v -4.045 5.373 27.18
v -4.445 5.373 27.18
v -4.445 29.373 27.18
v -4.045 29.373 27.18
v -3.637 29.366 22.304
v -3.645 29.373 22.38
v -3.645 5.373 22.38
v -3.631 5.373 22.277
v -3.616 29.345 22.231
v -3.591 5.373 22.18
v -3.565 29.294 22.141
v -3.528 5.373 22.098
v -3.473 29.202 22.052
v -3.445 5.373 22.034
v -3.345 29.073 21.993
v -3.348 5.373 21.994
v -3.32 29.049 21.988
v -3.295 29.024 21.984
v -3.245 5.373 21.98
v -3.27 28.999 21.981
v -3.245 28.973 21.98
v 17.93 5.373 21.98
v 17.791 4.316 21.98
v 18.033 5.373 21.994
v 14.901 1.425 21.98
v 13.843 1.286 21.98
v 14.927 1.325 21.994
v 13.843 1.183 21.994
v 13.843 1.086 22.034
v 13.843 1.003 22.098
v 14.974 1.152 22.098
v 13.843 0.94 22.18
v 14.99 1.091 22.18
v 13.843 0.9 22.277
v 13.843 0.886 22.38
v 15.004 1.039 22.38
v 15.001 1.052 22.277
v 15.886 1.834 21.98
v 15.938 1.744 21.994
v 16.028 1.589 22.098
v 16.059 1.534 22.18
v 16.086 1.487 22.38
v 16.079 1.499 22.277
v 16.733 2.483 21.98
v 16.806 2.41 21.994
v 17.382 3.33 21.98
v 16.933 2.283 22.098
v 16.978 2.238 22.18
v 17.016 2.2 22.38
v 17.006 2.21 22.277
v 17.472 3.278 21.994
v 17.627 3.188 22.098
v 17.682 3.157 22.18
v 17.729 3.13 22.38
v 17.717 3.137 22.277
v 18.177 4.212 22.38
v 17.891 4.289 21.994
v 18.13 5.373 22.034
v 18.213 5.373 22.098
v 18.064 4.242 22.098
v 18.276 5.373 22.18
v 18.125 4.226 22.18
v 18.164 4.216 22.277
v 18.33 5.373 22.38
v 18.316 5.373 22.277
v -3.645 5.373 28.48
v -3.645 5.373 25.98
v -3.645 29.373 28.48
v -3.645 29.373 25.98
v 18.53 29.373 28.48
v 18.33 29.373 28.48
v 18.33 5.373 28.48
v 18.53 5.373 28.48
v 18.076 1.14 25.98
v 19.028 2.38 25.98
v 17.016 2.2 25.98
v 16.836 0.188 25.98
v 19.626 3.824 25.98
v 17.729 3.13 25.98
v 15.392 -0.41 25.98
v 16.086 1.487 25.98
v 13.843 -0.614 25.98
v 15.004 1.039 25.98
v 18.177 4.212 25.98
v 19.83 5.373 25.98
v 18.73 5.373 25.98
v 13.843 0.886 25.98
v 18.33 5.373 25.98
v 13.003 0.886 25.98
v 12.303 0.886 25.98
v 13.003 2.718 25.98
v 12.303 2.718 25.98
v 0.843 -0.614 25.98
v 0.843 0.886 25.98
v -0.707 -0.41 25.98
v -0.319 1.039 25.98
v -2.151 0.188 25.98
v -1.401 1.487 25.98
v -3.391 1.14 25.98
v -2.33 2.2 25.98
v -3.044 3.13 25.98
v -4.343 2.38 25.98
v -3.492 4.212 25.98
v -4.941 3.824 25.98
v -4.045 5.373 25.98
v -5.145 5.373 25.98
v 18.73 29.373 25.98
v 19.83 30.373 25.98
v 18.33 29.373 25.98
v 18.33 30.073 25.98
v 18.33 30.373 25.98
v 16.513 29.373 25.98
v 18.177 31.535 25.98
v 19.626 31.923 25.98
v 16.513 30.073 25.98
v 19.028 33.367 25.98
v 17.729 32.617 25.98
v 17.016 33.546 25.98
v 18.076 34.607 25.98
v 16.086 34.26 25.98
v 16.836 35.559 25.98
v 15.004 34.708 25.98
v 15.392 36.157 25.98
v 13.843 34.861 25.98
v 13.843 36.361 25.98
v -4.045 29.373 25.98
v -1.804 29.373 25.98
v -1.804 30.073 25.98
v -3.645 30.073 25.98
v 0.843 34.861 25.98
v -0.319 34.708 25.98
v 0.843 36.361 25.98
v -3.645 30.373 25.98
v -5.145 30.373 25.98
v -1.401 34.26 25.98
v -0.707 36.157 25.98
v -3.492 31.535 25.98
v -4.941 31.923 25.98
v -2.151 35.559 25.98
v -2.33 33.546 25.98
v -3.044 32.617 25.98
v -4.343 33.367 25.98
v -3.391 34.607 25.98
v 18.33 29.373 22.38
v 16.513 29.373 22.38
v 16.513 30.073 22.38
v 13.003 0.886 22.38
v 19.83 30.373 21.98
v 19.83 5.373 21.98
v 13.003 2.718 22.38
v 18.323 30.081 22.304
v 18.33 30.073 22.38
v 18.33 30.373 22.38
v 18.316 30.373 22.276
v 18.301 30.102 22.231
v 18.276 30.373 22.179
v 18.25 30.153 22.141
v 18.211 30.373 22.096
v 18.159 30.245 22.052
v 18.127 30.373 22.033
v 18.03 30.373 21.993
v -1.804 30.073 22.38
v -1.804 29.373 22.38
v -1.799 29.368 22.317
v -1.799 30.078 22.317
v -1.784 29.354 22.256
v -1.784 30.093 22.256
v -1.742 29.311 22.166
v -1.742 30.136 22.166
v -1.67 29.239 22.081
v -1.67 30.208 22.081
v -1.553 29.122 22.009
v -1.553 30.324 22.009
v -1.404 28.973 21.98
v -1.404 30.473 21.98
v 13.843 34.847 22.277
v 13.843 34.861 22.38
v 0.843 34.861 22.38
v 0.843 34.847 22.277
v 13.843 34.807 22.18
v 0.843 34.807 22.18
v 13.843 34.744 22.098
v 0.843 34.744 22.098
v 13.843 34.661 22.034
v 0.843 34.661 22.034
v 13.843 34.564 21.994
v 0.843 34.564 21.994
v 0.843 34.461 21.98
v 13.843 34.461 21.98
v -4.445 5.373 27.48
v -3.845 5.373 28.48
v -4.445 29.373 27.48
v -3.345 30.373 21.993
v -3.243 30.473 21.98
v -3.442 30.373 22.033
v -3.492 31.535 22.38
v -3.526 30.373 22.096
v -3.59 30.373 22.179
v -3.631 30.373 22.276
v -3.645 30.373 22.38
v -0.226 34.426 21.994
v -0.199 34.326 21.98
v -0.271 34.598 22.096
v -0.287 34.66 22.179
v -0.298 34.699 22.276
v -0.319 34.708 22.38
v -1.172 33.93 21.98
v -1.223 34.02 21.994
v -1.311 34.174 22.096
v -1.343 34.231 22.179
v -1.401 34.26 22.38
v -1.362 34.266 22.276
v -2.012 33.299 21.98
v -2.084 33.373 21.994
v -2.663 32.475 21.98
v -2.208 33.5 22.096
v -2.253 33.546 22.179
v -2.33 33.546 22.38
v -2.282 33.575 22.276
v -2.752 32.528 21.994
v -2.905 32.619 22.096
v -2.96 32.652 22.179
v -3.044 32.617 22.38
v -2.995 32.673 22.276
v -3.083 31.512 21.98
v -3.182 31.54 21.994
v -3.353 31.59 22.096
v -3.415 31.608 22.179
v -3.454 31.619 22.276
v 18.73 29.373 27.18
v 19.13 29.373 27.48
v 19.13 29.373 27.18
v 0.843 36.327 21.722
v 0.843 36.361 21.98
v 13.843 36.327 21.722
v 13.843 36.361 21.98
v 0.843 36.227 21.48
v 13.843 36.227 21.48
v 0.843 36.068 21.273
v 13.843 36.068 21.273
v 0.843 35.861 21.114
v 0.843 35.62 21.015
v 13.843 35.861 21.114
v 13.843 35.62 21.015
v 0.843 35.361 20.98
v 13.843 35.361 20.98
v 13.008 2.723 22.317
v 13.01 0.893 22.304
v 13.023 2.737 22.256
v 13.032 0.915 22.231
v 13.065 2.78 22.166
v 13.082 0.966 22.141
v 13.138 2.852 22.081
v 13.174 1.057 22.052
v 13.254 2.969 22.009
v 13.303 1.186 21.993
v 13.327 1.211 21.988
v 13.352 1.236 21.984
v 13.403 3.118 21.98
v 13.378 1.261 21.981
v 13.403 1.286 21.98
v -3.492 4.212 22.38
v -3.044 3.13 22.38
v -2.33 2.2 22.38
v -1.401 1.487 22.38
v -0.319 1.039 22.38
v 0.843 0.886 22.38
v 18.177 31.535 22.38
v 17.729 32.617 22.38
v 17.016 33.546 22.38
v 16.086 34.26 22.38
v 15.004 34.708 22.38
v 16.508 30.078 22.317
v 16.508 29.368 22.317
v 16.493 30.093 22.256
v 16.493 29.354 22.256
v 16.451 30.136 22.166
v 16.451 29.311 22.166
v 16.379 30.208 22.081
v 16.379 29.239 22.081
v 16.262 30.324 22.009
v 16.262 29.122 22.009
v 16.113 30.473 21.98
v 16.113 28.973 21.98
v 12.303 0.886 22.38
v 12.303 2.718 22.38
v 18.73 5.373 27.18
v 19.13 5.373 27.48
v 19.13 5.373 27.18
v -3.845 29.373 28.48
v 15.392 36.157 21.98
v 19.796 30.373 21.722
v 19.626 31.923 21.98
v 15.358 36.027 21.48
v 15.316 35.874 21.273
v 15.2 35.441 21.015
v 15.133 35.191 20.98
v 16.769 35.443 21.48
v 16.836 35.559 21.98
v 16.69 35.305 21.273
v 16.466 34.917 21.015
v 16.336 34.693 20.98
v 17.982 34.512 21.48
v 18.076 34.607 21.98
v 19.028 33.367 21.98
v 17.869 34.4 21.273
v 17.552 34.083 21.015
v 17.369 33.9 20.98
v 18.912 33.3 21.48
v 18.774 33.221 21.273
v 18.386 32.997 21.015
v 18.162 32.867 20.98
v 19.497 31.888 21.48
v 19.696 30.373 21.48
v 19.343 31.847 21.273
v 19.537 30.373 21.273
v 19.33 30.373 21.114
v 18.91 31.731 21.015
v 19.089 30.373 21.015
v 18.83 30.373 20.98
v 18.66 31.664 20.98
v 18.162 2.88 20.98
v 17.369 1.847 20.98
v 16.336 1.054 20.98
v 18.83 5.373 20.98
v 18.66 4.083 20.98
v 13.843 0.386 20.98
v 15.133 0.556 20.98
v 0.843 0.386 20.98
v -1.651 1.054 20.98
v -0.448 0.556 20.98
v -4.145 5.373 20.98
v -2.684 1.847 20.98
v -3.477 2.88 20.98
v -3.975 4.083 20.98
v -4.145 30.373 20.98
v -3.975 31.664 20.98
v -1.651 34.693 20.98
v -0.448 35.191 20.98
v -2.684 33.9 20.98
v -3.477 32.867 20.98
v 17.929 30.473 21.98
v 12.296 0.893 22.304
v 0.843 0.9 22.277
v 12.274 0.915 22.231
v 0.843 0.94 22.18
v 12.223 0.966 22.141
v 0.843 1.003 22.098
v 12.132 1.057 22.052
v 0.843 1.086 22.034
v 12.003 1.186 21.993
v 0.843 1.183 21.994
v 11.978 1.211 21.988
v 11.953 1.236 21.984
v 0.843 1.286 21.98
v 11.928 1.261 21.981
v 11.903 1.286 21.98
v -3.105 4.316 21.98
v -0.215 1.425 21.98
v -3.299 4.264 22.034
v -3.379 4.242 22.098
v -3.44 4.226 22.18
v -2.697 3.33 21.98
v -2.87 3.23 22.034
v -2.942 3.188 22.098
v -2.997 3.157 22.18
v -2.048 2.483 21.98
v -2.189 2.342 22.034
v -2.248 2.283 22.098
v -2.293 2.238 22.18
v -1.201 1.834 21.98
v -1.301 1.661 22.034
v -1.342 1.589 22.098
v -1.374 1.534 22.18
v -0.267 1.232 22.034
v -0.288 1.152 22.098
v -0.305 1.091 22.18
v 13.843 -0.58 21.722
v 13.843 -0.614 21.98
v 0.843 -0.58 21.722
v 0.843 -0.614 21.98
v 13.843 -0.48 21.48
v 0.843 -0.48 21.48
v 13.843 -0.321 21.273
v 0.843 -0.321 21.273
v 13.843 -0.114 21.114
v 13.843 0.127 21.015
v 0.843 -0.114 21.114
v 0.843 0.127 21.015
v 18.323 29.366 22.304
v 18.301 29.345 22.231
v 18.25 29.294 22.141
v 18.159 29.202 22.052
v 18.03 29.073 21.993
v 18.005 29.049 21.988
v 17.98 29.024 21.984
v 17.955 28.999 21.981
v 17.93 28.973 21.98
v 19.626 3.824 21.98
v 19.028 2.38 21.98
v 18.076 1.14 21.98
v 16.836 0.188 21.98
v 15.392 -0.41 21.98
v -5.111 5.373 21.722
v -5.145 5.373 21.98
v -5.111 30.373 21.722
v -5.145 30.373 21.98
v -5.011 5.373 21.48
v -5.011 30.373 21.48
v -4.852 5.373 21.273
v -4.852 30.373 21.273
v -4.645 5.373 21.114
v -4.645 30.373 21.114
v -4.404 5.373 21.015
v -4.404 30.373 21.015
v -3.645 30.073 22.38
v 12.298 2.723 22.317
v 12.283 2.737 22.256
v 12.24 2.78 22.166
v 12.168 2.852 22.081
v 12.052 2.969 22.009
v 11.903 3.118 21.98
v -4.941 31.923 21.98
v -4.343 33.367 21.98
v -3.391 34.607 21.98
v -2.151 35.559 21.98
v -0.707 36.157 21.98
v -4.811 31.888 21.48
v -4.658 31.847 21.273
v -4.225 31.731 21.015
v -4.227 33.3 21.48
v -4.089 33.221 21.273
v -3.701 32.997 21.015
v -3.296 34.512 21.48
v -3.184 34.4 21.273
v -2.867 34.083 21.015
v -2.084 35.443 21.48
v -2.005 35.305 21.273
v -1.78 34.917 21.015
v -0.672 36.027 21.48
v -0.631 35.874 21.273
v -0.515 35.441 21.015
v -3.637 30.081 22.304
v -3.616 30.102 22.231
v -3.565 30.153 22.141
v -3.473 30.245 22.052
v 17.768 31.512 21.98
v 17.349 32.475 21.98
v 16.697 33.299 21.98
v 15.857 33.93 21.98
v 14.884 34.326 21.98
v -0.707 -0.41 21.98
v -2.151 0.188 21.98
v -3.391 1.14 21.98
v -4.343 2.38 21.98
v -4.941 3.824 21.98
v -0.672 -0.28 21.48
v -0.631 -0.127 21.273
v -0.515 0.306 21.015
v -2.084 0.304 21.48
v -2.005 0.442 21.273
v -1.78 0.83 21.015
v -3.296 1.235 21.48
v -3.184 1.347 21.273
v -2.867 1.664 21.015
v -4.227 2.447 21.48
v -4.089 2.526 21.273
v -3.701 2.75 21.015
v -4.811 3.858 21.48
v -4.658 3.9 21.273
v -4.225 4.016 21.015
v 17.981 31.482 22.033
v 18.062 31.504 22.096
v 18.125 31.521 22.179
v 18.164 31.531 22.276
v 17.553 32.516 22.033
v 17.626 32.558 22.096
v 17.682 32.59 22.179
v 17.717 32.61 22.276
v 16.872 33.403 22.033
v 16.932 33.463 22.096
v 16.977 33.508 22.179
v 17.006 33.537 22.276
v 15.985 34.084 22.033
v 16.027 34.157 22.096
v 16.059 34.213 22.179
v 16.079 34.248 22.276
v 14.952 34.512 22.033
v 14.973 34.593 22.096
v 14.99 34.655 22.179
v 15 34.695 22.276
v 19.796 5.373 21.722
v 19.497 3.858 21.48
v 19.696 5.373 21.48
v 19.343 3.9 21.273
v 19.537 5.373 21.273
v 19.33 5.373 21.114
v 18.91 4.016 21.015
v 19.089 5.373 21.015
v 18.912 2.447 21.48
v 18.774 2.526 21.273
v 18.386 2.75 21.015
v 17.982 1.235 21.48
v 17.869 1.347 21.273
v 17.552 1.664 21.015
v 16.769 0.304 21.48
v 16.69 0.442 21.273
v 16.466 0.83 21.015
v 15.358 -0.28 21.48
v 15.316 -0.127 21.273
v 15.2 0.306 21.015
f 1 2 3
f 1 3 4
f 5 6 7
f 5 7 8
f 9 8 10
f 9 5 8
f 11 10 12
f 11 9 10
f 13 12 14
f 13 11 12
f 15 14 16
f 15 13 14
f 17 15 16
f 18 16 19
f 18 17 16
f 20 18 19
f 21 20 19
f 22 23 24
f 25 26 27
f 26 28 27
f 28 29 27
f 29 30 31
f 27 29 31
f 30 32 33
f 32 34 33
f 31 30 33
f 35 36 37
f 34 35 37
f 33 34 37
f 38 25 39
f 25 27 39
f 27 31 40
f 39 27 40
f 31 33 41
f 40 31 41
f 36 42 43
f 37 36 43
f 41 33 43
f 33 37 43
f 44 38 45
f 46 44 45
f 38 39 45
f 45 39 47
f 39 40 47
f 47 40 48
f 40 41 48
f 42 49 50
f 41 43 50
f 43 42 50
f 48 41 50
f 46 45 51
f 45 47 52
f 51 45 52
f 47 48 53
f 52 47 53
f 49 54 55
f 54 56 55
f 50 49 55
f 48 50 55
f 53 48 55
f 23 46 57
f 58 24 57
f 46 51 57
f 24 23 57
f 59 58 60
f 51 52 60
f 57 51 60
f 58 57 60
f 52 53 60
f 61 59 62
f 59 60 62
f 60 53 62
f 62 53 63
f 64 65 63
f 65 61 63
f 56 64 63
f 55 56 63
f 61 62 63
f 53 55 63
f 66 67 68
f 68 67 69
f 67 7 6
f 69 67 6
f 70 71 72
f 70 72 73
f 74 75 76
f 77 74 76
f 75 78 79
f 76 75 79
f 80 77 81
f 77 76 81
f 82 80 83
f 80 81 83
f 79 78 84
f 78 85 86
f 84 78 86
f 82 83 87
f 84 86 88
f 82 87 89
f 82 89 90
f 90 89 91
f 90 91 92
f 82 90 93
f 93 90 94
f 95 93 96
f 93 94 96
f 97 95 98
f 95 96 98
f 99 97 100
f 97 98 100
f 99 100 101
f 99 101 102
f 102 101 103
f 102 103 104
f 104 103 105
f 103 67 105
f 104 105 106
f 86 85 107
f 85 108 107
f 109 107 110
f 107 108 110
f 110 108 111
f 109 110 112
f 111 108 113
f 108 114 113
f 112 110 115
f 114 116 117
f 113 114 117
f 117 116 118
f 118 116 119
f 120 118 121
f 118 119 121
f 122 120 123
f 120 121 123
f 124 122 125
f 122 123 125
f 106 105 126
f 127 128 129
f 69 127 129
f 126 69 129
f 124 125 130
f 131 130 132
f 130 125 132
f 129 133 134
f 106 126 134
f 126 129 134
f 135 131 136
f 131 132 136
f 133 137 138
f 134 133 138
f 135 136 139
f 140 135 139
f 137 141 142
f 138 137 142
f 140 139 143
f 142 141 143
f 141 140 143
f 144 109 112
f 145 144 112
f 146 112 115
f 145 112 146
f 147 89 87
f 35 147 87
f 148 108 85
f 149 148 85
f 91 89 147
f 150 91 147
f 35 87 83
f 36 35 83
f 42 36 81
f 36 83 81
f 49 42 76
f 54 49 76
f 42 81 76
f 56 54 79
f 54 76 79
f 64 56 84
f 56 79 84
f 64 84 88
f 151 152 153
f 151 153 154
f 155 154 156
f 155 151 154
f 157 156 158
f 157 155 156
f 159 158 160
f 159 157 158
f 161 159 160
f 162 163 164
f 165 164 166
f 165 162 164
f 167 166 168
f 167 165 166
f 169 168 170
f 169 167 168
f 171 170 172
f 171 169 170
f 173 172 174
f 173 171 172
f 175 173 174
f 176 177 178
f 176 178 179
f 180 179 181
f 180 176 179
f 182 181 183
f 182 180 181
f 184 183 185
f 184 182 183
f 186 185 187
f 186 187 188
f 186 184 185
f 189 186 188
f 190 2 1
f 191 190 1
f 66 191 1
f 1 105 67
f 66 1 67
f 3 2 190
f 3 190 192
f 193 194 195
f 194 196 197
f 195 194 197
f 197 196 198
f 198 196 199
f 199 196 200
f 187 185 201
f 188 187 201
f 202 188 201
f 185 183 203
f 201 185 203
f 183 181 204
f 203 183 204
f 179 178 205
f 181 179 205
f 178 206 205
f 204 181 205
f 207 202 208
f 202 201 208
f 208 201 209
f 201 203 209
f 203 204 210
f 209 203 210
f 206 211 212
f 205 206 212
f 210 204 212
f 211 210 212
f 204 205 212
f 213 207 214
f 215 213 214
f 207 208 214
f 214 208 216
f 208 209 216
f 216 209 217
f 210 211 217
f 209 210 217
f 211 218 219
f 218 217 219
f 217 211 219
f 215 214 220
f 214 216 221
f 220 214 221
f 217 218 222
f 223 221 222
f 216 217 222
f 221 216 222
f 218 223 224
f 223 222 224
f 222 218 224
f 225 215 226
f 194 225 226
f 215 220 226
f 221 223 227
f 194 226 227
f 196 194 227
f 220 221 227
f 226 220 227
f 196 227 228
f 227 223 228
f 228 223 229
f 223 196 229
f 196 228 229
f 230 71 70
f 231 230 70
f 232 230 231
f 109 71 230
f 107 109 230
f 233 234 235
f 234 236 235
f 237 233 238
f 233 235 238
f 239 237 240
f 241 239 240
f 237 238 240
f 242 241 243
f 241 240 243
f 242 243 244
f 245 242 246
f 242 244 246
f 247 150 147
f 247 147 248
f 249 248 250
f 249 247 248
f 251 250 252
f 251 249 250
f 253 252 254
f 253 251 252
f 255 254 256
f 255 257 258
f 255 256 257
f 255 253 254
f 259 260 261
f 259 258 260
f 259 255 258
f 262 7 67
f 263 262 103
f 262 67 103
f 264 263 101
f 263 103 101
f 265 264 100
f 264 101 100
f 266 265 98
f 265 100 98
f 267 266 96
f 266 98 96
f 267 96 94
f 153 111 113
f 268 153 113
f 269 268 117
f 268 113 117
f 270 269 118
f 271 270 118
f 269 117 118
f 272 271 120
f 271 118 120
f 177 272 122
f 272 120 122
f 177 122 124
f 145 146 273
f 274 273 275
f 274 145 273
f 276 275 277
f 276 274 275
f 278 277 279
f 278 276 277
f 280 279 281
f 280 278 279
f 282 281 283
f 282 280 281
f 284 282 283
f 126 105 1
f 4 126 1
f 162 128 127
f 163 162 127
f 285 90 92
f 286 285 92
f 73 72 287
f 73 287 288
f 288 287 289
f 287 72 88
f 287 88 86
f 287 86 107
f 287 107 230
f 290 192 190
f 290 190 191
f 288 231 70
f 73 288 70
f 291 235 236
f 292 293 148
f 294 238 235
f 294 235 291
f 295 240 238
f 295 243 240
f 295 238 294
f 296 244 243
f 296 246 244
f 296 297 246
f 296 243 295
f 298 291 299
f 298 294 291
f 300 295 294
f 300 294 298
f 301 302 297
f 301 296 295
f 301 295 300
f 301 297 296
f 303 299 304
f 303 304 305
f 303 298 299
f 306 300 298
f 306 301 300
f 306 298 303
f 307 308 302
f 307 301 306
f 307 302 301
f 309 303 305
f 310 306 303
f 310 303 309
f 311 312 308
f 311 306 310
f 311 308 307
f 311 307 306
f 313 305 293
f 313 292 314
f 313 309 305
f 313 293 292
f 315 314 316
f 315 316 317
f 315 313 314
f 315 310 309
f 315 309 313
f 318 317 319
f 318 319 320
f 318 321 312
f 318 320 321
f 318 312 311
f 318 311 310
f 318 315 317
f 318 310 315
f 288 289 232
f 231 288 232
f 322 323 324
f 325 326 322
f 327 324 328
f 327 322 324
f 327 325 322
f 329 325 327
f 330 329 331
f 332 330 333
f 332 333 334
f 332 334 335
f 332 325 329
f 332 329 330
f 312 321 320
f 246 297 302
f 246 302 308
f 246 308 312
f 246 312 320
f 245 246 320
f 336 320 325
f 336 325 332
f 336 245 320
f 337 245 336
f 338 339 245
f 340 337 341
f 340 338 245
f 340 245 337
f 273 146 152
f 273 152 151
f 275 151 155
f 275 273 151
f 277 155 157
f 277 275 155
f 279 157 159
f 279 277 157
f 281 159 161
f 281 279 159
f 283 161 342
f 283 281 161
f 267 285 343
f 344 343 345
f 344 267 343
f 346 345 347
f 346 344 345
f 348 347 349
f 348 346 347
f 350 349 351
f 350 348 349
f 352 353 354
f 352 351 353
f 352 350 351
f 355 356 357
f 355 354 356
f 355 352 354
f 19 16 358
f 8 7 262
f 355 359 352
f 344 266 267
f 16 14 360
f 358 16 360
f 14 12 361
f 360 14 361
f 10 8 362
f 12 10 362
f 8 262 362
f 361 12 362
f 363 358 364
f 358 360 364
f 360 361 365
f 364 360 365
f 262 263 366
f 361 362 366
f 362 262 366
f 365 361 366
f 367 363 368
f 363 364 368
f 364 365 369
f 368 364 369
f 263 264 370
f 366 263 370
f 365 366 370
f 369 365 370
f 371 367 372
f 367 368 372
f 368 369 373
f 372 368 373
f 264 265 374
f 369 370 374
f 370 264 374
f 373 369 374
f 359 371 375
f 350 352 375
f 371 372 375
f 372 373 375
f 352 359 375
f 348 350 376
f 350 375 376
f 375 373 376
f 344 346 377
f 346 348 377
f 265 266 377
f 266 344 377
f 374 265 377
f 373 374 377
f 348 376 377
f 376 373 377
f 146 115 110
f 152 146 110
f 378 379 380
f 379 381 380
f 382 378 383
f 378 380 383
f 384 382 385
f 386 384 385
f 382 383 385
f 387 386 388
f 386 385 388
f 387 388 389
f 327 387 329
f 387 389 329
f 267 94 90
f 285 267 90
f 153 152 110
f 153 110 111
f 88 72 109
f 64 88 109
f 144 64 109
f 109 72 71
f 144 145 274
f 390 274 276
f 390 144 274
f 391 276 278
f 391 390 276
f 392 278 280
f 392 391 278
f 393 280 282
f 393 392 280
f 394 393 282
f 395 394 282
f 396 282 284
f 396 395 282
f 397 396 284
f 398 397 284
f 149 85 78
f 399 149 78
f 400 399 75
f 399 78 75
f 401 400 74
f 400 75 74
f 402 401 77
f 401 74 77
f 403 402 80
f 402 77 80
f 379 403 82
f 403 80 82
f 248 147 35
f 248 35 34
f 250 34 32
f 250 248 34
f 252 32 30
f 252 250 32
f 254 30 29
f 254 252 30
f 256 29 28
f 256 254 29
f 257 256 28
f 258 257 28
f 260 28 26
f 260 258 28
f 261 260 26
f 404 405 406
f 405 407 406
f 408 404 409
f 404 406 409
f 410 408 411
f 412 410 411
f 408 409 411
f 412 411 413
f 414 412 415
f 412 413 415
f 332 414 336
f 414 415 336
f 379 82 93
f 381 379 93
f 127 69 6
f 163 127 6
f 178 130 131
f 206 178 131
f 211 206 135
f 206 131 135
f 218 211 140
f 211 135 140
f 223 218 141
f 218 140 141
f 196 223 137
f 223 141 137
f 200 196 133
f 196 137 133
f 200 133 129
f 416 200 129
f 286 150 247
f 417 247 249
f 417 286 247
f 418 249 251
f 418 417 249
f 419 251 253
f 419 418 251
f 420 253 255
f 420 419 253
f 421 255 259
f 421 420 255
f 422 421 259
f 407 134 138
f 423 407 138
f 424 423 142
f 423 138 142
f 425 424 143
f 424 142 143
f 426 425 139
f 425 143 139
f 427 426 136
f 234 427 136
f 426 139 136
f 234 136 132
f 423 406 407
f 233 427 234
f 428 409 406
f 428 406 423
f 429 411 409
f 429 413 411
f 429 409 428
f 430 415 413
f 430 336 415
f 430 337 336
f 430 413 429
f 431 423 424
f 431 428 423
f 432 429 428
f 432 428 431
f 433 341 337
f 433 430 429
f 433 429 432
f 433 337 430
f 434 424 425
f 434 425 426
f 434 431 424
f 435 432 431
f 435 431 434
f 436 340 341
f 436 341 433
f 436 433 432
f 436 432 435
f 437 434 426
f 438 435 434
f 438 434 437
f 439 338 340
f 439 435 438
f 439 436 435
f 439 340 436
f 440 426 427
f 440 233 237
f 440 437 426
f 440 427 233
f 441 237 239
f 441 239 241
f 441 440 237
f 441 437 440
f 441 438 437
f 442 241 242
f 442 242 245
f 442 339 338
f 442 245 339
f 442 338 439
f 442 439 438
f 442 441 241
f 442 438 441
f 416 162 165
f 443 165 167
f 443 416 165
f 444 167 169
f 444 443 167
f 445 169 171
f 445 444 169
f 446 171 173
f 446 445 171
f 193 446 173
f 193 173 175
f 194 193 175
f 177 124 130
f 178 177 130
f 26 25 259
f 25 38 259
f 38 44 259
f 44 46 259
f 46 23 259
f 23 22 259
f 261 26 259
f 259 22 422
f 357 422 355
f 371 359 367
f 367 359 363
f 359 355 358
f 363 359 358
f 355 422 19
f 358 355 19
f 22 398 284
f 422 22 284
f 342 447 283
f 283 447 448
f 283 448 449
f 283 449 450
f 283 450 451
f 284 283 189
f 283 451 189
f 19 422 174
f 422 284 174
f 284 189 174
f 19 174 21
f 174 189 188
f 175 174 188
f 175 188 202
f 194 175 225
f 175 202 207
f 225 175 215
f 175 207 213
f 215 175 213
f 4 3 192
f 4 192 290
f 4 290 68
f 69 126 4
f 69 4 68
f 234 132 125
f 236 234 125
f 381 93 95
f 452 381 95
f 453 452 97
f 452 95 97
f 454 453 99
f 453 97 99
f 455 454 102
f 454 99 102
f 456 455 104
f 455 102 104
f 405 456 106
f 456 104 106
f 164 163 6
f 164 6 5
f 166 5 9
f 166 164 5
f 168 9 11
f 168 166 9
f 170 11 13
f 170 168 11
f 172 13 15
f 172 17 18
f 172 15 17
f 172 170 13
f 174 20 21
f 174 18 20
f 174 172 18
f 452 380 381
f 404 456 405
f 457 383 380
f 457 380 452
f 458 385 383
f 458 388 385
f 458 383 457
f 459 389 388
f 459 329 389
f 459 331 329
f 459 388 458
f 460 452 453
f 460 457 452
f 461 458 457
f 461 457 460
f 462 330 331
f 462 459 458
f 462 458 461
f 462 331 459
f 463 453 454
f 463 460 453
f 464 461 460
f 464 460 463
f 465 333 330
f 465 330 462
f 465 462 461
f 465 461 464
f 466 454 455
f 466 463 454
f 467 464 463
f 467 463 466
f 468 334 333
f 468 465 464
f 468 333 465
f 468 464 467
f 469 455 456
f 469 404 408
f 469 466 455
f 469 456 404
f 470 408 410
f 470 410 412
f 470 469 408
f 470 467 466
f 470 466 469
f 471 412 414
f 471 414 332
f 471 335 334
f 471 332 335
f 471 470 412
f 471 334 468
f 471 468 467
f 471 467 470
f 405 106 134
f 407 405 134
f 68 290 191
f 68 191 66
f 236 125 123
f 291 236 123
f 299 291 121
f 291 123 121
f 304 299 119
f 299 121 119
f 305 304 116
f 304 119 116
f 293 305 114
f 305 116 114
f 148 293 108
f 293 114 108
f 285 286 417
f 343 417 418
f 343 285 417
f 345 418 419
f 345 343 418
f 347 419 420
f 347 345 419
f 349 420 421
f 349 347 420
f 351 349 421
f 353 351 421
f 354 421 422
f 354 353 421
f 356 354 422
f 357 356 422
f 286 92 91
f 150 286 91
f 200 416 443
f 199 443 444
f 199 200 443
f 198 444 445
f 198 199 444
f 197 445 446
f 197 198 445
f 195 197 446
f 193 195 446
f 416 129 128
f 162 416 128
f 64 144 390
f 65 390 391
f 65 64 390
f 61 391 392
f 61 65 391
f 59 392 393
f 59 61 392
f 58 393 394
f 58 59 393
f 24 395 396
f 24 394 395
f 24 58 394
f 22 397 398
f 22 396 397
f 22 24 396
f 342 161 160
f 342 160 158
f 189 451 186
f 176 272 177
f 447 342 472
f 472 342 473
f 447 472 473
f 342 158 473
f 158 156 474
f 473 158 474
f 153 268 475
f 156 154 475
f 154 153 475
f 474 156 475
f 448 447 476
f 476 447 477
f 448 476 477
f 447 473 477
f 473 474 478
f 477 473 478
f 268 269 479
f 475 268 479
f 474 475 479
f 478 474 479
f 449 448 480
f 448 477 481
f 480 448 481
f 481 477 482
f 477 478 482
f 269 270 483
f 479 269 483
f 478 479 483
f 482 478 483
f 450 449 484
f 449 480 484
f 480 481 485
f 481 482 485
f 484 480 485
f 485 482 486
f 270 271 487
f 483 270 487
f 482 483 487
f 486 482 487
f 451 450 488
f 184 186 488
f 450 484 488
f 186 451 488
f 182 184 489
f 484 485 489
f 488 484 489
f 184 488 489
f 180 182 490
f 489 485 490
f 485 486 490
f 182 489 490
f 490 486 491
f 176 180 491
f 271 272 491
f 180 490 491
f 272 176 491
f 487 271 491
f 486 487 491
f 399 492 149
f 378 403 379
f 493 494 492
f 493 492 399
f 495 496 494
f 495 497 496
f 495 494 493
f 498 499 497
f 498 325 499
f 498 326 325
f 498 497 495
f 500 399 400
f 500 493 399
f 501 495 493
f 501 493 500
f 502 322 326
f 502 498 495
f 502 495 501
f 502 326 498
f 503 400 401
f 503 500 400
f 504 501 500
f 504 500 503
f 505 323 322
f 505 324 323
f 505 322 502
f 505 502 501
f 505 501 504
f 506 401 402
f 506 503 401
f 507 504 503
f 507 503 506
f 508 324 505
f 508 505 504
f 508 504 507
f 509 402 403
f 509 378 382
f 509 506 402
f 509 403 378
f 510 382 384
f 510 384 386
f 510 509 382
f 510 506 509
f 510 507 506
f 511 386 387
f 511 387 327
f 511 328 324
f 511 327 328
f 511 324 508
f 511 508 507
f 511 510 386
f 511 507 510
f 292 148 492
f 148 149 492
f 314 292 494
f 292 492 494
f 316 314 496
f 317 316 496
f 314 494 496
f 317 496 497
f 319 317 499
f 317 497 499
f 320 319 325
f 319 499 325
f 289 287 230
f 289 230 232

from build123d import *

# Parameters (mm, degrees)
BOSS_EXTRUDE1_DEPTH = 4
BOSS_EXTRUDE2_DEPTH = 1
SKETCH3_W           = 0.8
SKETCH3_H           = 24.00004826
BOSS_EXTRUDE3_DEPTH = 2.5
CUT_EXTRUDE1_REACH  = 48.525
SKETCH4_W           = 0.4
SKETCH4_H           = 1.2
FILLET1_R           = 1
FILLET2_R           = 0.4


with BuildPart() as part:
    # Sketch1 → Boss-Extrude1 (new body)
    with BuildSketch(Plane(origin=(0, 0, 25.980449513), x_dir=(-1, 0, 0), z_dir=(0, 0, -1))):
        with BuildLine():
            Line((-0.842601542, 36.360791374), (-13.842629482, 36.360791374))
            ThreePointArc((-13.842629482, 36.360791374), (-18.076295283, 34.607149581), (-19.829937076, 30.37348378))
            Line((-19.829937076, 30.37348378), (-19.829937076, 5.373432979))
            ThreePointArc((-19.829937076, 5.373432979), (-18.076295283, 1.139767178), (-13.842629482, -0.613874615))
            Line((-13.842629482, -0.613874615), (-0.842601542, -0.613874615))
            ThreePointArc((-0.842601542, -0.613874615), (3.391064259, 1.139767178), (5.144706053, 5.373432979))
            Line((5.144706053, 5.373432979), (5.144706053, 30.37348378))
            ThreePointArc((5.144706053, 30.37348378), (3.391064259, 34.607149581), (-0.842601542, 36.360791374))
        make_face()
        with BuildLine():
            Line((-18.329937076, 29.373481239), (-16.513394023, 29.373481239))
            Line((-16.513394023, 29.373481239), (-16.513394023, 30.07348378))
            Line((-16.513394023, 30.07348378), (-18.329937076, 30.07348378))
            Line((-18.329937076, 30.07348378), (-18.329937076, 30.37348378))
            ThreePointArc((-18.329937076, 30.37348378), (-17.015635111, 33.546489409), (-13.842629482, 34.860791374))
            Line((-13.842629482, 34.860791374), (-0.842601542, 34.860791374))
            ThreePointArc((-0.842601542, 34.860791374), (2.330404088, 33.546489409), (3.644706053, 30.37348378))
            Line((3.644706053, 30.37348378), (3.644706053, 30.07348378))
            Line((3.644706053, 30.07348378), (1.804401252, 30.07348378))
            Line((1.804401252, 30.07348378), (1.804401252, 29.373481239))
            Line((1.804401252, 29.373481239), (3.644706053, 29.373481239))
            Line((3.644706053, 29.373481239), (3.644706053, 5.373432979))
            ThreePointArc((3.644706053, 5.373432979), (2.330404088, 2.20042735), (-0.842601542, 0.886125385))
            Line((-0.842601542, 0.886125385), (-12.302827602, 0.886125385))
            Line((-12.302827602, 0.886125385), (-12.302827602, 2.717512228))
            Line((-12.302827602, 2.717512228), (-13.002830142, 2.717512228))
            Line((-13.002830142, 2.717512228), (-13.002830142, 0.886125385))
            Line((-13.002830142, 0.886125385), (-13.842629482, 0.886125385))
            ThreePointArc((-13.842629482, 0.886125385), (-17.015635111, 2.20042735), (-18.329937076, 5.373432979))
            Line((-18.329937076, 5.373432979), (-18.329937076, 29.373481239))
        make_face(mode=Mode.SUBTRACT)
    extrude(amount=BOSS_EXTRUDE1_DEPTH)

    # Sketch2 → Boss-Extrude2 (add)
    with BuildSketch(Plane(origin=(0, 0, 21.980449513), x_dir=(-1, 0, 0), z_dir=(0, 0, -1))):
        with BuildLine():
            Line((-19.829937076, 30.37348378), (-19.829937076, 5.373432979))
            ThreePointArc((-19.829937076, 5.373432979), (-18.076295283, 1.139767178), (-13.842629482, -0.613874615))
            Line((-13.842629482, -0.613874615), (-0.842601542, -0.613874615))
            ThreePointArc((-0.842601542, -0.613874615), (3.391064259, 1.139767178), (5.144706053, 5.373432979))
            Line((5.144706053, 5.373432979), (5.144706053, 30.37348378))
            ThreePointArc((5.144706053, 30.37348378), (3.391064259, 34.607149581), (-0.842601542, 36.360791374))
            Line((-0.842601542, 36.360791374), (-13.842629482, 36.360791374))
            ThreePointArc((-13.842629482, 36.360791374), (-18.076295283, 34.607149581), (-19.829937076, 30.37348378))
        make_face()
    extrude(amount=BOSS_EXTRUDE2_DEPTH)

    # Sketch3 → Boss-Extrude3 (add)
    with BuildSketch(Plane.XY.offset(25.980449513)):
        with Locations((-4.044706053, 17.373457109)):
            Rectangle(SKETCH3_W, SKETCH3_H)
        with Locations((18.729937076, 17.373457109)):
            Rectangle(SKETCH3_W, SKETCH3_H)
    extrude(amount=BOSS_EXTRUDE3_DEPTH)

    # Sketch4 → Cut-Extrude1 (cut, up to next)
    with BuildSketch(Plane.XZ.offset(-5.373432979), mode=Mode.PRIVATE) as cut_extrude1_sk1:
        with Locations((-4.244706053, 26.580449513)):
            Rectangle(SKETCH4_W, SKETCH4_H)
    cut_extrude1_tool1 = extrude(cut_extrude1_sk1.sketch, amount=-CUT_EXTRUDE1_REACH, mode=Mode.PRIVATE) & part.part
    # Sketch4 → Cut-Extrude1 (cut, up to next)
    with BuildSketch(Plane.XZ.offset(-5.373432979), mode=Mode.PRIVATE) as cut_extrude1_sk2:
        Polygon((-4.444706053, 28.480449513), (-4.444706053, 27.480449513), (-3.844706053, 28.480449513), align=None)
    cut_extrude1_tool2 = extrude(cut_extrude1_sk2.sketch, amount=-CUT_EXTRUDE1_REACH, mode=Mode.PRIVATE) & part.part
    # Sketch4 → Cut-Extrude1 (cut, up to next)
    with BuildSketch(Plane.XZ.offset(-5.373432979), mode=Mode.PRIVATE) as cut_extrude1_sk3:
        with Locations((18.929937076, 26.580449513)):
            Rectangle(SKETCH4_W, SKETCH4_H)
    cut_extrude1_tool3 = extrude(cut_extrude1_sk3.sketch, amount=-CUT_EXTRUDE1_REACH, mode=Mode.PRIVATE) & part.part
    # Sketch4 → Cut-Extrude1 (cut, up to next)
    with BuildSketch(Plane.XZ.offset(-5.373432979), mode=Mode.PRIVATE) as cut_extrude1_sk4:
        Polygon((18.529937076, 28.480449513), (19.129937076, 28.480449513), (19.129937076, 27.480449513), align=None)
    cut_extrude1_tool4 = extrude(cut_extrude1_sk4.sketch, amount=-CUT_EXTRUDE1_REACH, mode=Mode.PRIVATE) & part.part
    add(cut_extrude1_tool1.solids().sort_by_distance((-4.244706, 5.373433, 26.58045))[0], mode=Mode.SUBTRACT)
    add(cut_extrude1_tool2.solids().sort_by_distance((-4.244706, 5.373433, 28.147116))[0], mode=Mode.SUBTRACT)
    add(cut_extrude1_tool3.solids().sort_by_distance((18.929937, 5.373433, 26.58045))[0], mode=Mode.SUBTRACT)
    add(cut_extrude1_tool4.solids().sort_by_distance((18.929937, 5.373433, 28.147116))[0], mode=Mode.SUBTRACT)

    # Fillet1
    fillet1_edges = [part.edges().sort_by_distance(p)[0] for p in [
        (18.076295283, 34.607149581, 20.980449513),
        (19.829937076, 17.873458379, 20.980449513),
        (18.076295283, 1.139767178, 20.980449513),
        (7.342615512, -0.613874615, 20.980449513),
        (-3.391064259, 1.139767178, 20.980449513),
        (-5.144706053, 17.873458379, 20.980449513),
        (-3.391064259, 34.607149581, 20.980449513),
        (7.342615512, 36.360791374, 20.980449513),
    ]]
    fillet(fillet1_edges, radius=FILLET1_R)

    # Fillet2
    # the kernel refuses this fillet: 0.4 mm, written as the material it adds along each edge
    with BuildSketch(Plane(origin=(13.842629482, 34.860791374, 21.980449513), x_dir=(0, 0, 1), z_dir=(-1, 0, 0))) as fillet2_piece_1:
        with BuildLine():
            CenterArc((FILLET2_R, -FILLET2_R), FILLET2_R, 90, 90)
            Line((0, -FILLET2_R), (0, 0))
            Line((0, 0), (FILLET2_R, 0))
        make_face()
    extrude(amount=13.00002794)
    with BuildSketch(Plane(origin=(13.842629482, 30.37348378, 21.980449513), x_dir=(1, 0, 0), z_dir=(0, -1, 0))) as fillet2_piece_2:
        with BuildLine():
            CenterArc((4.487307595 - FILLET2_R, FILLET2_R), FILLET2_R, 270, 90)
            Line((4.487307595 - FILLET2_R, 0), (4.487307595, 0))
            Line((4.487307595, 0), (4.487307595, FILLET2_R))
        make_face()
    revolve(axis=Axis((13.842629482, 30.37348378, 21.980449513), (0, 0, 1)), revolution_arc=90)
    with BuildSketch(Plane(origin=(16.513394023, 30.07348378, 21.980449513), x_dir=(0, 0, 1), z_dir=(1, 0, 0)), Plane(origin=(19.329937076, 29.373481239, 21.980449513), x_dir=(0, 0, 1), z_dir=(-1, 0, 0))) as fillet2_piece_3:
        with BuildLine():
            CenterArc((FILLET2_R, -FILLET2_R), FILLET2_R, 90, 90)
            Line((0, -FILLET2_R), (0, 0))
            Line((0, 0), (FILLET2_R, 0))
        make_face()
    extrude(amount=2.816543053)
    with BuildSketch(Plane(origin=(16.513394023, 29.373481239, 21.980449513), x_dir=(0, 0, 1), z_dir=(0, 1, 0)), Plane(origin=(12.302827602, 2.717512228, 21.980449513), x_dir=(0, 0, 1), z_dir=(1, 0, 0)), Plane(origin=(-1.804401252, 30.07348378, 21.980449513), x_dir=(0, 0, 1), z_dir=(0, -1, 0))) as fillet2_piece_4:
        with BuildLine():
            CenterArc((FILLET2_R, -FILLET2_R), FILLET2_R, 90, 90)
            Line((0, -FILLET2_R), (0, 0))
            Line((0, 0), (FILLET2_R, 0))
        make_face()
    extrude(amount=0.70000254)
    with BuildSketch(Plane(origin=(18.329937076, 5.373432979, 21.980449513), x_dir=(-1, 0, 0), z_dir=(0, 1, 0)), Plane(origin=(-3.644706053, 30.373481239, 21.980449513), x_dir=(1, 0, 0), z_dir=(0, -1, 0))) as fillet2_piece_5:
        with BuildLine():
            CenterArc((FILLET2_R, FILLET2_R), FILLET2_R, 180, 90)
            Line((0, FILLET2_R), (0, 0))
            Line((0, 0), (FILLET2_R, 0))
        make_face()
    extrude(amount=25.00004826)
    with BuildSketch(Plane(origin=(13.842629482, 5.373432979, 21.980449513), x_dir=(0, -1, 0), z_dir=(-1, 0, 0))) as fillet2_piece_6:
        with BuildLine():
            CenterArc((4.487307595 - FILLET2_R, FILLET2_R), FILLET2_R, 270, 90)
            Line((4.487307595 - FILLET2_R, 0), (4.487307595, 0))
            Line((4.487307595, 0), (4.487307595, FILLET2_R))
        make_face()
    revolve(axis=Axis((13.842629482, 5.373432979, 21.980449513), (0, 0, 1)), revolution_arc=90)
    with BuildSketch(Plane(origin=(12.002830142, 0.886125385, 21.980449513), x_dir=(0, 0, 1), z_dir=(1, 0, 0))) as fillet2_piece_7:
        with BuildLine():
            CenterArc((FILLET2_R, -FILLET2_R), FILLET2_R, 90, 90)
            Line((0, -FILLET2_R), (0, 0))
            Line((0, 0), (FILLET2_R, 0))
        make_face()
    extrude(amount=1.83979934)
    with BuildSketch(Plane(origin=(13.002830142, 2.717512228, 21.980449513), x_dir=(0, 0, 1), z_dir=(0, -1, 0)), Plane(origin=(12.302827602, -0.113874615, 21.980449513), x_dir=(0, 0, 1), z_dir=(0, 1, 0))) as fillet2_piece_8:
        with BuildLine():
            CenterArc((FILLET2_R, -FILLET2_R), FILLET2_R, 90, 90)
            Line((0, -FILLET2_R), (0, 0))
            Line((0, 0), (FILLET2_R, 0))
        make_face()
    extrude(amount=2.831386843)
    with BuildSketch(Plane(origin=(0.842601542, 0.886125385, 21.980449513), x_dir=(0, 0, 1), z_dir=(1, 0, 0))) as fillet2_piece_9:
        with BuildLine():
            CenterArc((FILLET2_R, -FILLET2_R), FILLET2_R, 90, 90)
            Line((0, -FILLET2_R), (0, 0))
            Line((0, 0), (FILLET2_R, 0))
        make_face()
    extrude(amount=12.46022606)
    with BuildSketch(Plane(origin=(0.842601542, 5.373432979, 21.980449513), x_dir=(-1, 0, 0), z_dir=(0, 1, 0))) as fillet2_piece_10:
        with BuildLine():
            CenterArc((4.487307595 - FILLET2_R, FILLET2_R), FILLET2_R, 270, 90)
            Line((4.487307595 - FILLET2_R, 0), (4.487307595, 0))
            Line((4.487307595, 0), (4.487307595, FILLET2_R))
        make_face()
    revolve(axis=Axis((0.842601542, 5.373432979, 21.980449513), (0, 0, 1)), revolution_arc=90)
    with BuildSketch(Plane(origin=(-1.804401252, 29.373481239, 21.980449513), x_dir=(0, 0, 1), z_dir=(-1, 0, 0)), Plane(origin=(-4.644706053, 30.07348378, 21.980449513), x_dir=(0, 0, 1), z_dir=(1, 0, 0))) as fillet2_piece_11:
        with BuildLine():
            CenterArc((FILLET2_R, -FILLET2_R), FILLET2_R, 90, 90)
            Line((0, -FILLET2_R), (0, 0))
            Line((0, 0), (FILLET2_R, 0))
        make_face()
    extrude(amount=2.840304801)
    with BuildSketch(Plane(origin=(0.842601542, 30.37348378, 21.980449513), x_dir=(0, 1, 0), z_dir=(1, 0, 0))) as fillet2_piece_12:
        with BuildLine():
            CenterArc((4.487307595 - FILLET2_R, FILLET2_R), FILLET2_R, 270, 90)
            Line((4.487307595 - FILLET2_R, 0), (4.487307595, 0))
            Line((4.487307595, 0), (4.487307595, FILLET2_R))
        make_face()
    revolve(axis=Axis((0.842601542, 30.37348378, 21.980449513), (0, 0, 1)), revolution_arc=90)
    with BuildSketch(Plane(origin=(-3.644706053, 30.37348378, 21.980449513), x_dir=(0, 0, 1), z_dir=(0, -1, 0)), Plane(origin=(18.329937076, 29.07348378, 21.980449513), x_dir=(0, 0, 1), z_dir=(0, 1, 0))) as fillet2_piece_13:
        with BuildLine():
            CenterArc((FILLET2_R, -FILLET2_R), FILLET2_R, 90, 90)
            Line((0, -FILLET2_R), (0, 0))
            Line((0, 0), (FILLET2_R, 0))
        make_face()
    extrude(amount=1.3)
    with BuildSketch(Plane(origin=(16.513394023, 29.373481239, 21.980449513), x_dir=(0, 0, 1), z_dir=(0, 1, 0))) as fillet2_piece_14a_section:
        with BuildLine():
            CenterArc((FILLET2_R, -FILLET2_R), FILLET2_R, 90, 90)
            Line((0, -FILLET2_R), (0, 0))
            Line((0, 0), (FILLET2_R, 0))
        make_face()
    fillet2_piece_14a = extrude(amount=1.70000254, mode=Mode.PRIVATE)
    fillet2_piece_14a = split(fillet2_piece_14a, bisect_by=Plane(origin=(16.422835978, 30.07348378, 22.071007558), z_dir=(0, 1, 0)), keep=Keep.TOP, mode=Mode.PRIVATE)
    with BuildSketch(Plane(origin=(15.513394023, 30.07348378, 21.980449513), x_dir=(0, 0, 1), z_dir=(1, 0, 0))) as fillet2_piece_14b_section:
        with BuildLine():
            CenterArc((FILLET2_R, -FILLET2_R), FILLET2_R, 90, 90)
            Line((0, -FILLET2_R), (0, 0))
            Line((0, 0), (FILLET2_R, 0))
        make_face()
    fillet2_piece_14b = extrude(amount=2.816543053, mode=Mode.PRIVATE)
    fillet2_piece_14b = split(fillet2_piece_14b, bisect_by=Plane(origin=(16.513394023, 30.164041825, 22.071007558), z_dir=(-1, 0, 0)), keep=Keep.TOP, mode=Mode.PRIVATE)
    fillet2_piece_14 = fillet2_piece_14a & fillet2_piece_14b
    add(fillet2_piece_14)
    with BuildSketch(Plane(origin=(18.329937076, 29.373481239, 21.980449513), x_dir=(0, 0, 1), z_dir=(-1, 0, 0))) as fillet2_piece_15a_section:
        with BuildLine():
            CenterArc((FILLET2_R, -FILLET2_R), FILLET2_R, 90, 90)
            Line((0, -FILLET2_R), (0, 0))
            Line((0, 0), (FILLET2_R, 0))
        make_face()
    fillet2_piece_15a = extrude(amount=2.816543053, mode=Mode.PRIVATE)
    fillet2_piece_15a = split(fillet2_piece_15a, bisect_by=Plane(origin=(16.513394023, 29.282923194, 22.071007558), z_dir=(-1, 0, 0)), keep=Keep.TOP, mode=Mode.PRIVATE)
    with BuildSketch(Plane(origin=(16.513394023, 28.373481239, 21.980449513), x_dir=(0, 0, 1), z_dir=(0, 1, 0))) as fillet2_piece_15b_section:
        with BuildLine():
            CenterArc((FILLET2_R, -FILLET2_R), FILLET2_R, 90, 90)
            Line((0, -FILLET2_R), (0, 0))
            Line((0, 0), (FILLET2_R, 0))
        make_face()
    fillet2_piece_15b = extrude(amount=1.70000254, mode=Mode.PRIVATE)
    fillet2_piece_15b = split(fillet2_piece_15b, bisect_by=Plane(origin=(16.422835978, 29.373481239, 22.071007558), z_dir=(0, -1, 0)), keep=Keep.TOP, mode=Mode.PRIVATE)
    fillet2_piece_15 = fillet2_piece_15a & fillet2_piece_15b
    add(fillet2_piece_15)
    with BuildSketch(Plane(origin=(12.302827602, 2.717512228, 21.980449513), x_dir=(0, 0, 1), z_dir=(1, 0, 0))) as fillet2_piece_16a_section:
        with BuildLine():
            CenterArc((FILLET2_R, -FILLET2_R), FILLET2_R, 90, 90)
            Line((0, -FILLET2_R), (0, 0))
            Line((0, 0), (FILLET2_R, 0))
        make_face()
    fillet2_piece_16a = extrude(amount=1.70000254, mode=Mode.PRIVATE)
    fillet2_piece_16a = split(fillet2_piece_16a, bisect_by=Plane(origin=(13.002830142, 2.808070273, 22.071007558), z_dir=(1, 0, 0)), keep=Keep.TOP, mode=Mode.PRIVATE)
    with BuildSketch(Plane(origin=(13.002830142, 3.717512228, 21.980449513), x_dir=(0, 0, 1), z_dir=(0, -1, 0))) as fillet2_piece_16b_section:
        with BuildLine():
            CenterArc((FILLET2_R, -FILLET2_R), FILLET2_R, 90, 90)
            Line((0, -FILLET2_R), (0, 0))
            Line((0, 0), (FILLET2_R, 0))
        make_face()
    fillet2_piece_16b = extrude(amount=2.831386843, mode=Mode.PRIVATE)
    fillet2_piece_16b = split(fillet2_piece_16b, bisect_by=Plane(origin=(13.093388188, 2.717512228, 22.071007558), z_dir=(0, 1, 0)), keep=Keep.TOP, mode=Mode.PRIVATE)
    fillet2_piece_16 = fillet2_piece_16a & fillet2_piece_16b
    add(fillet2_piece_16)
    with BuildSketch(Plane(origin=(12.302827602, 0.886125385, 21.980449513), x_dir=(0, 0, 1), z_dir=(0, 1, 0))) as fillet2_piece_17a_section:
        with BuildLine():
            CenterArc((FILLET2_R, -FILLET2_R), FILLET2_R, 90, 90)
            Line((0, -FILLET2_R), (0, 0))
            Line((0, 0), (FILLET2_R, 0))
        make_face()
    fillet2_piece_17a = extrude(amount=2.831386843, mode=Mode.PRIVATE)
    fillet2_piece_17a = split(fillet2_piece_17a, bisect_by=Plane(origin=(12.212269557, 2.717512228, 22.071007558), z_dir=(0, 1, 0)), keep=Keep.TOP, mode=Mode.PRIVATE)
    with BuildSketch(Plane(origin=(11.302827602, 2.717512228, 21.980449513), x_dir=(0, 0, 1), z_dir=(1, 0, 0))) as fillet2_piece_17b_section:
        with BuildLine():
            CenterArc((FILLET2_R, -FILLET2_R), FILLET2_R, 90, 90)
            Line((0, -FILLET2_R), (0, 0))
            Line((0, 0), (FILLET2_R, 0))
        make_face()
    fillet2_piece_17b = extrude(amount=1.70000254, mode=Mode.PRIVATE)
    fillet2_piece_17b = split(fillet2_piece_17b, bisect_by=Plane(origin=(12.302827602, 2.808070273, 22.071007558), z_dir=(-1, 0, 0)), keep=Keep.TOP, mode=Mode.PRIVATE)
    fillet2_piece_17 = fillet2_piece_17a & fillet2_piece_17b
    add(fillet2_piece_17)
    with BuildSketch(Plane(origin=(-1.804401252, 30.07348378, 21.980449513), x_dir=(0, 0, 1), z_dir=(0, -1, 0))) as fillet2_piece_18a_section:
        with BuildLine():
            CenterArc((FILLET2_R, -FILLET2_R), FILLET2_R, 90, 90)
            Line((0, -FILLET2_R), (0, 0))
            Line((0, 0), (FILLET2_R, 0))
        make_face()
    fillet2_piece_18a = extrude(amount=1.70000254, mode=Mode.PRIVATE)
    fillet2_piece_18a = split(fillet2_piece_18a, bisect_by=Plane(origin=(-1.713843206, 29.373481239, 22.071007558), z_dir=(0, -1, 0)), keep=Keep.TOP, mode=Mode.PRIVATE)
    with BuildSketch(Plane(origin=(-0.804401252, 29.373481239, 21.980449513), x_dir=(0, 0, 1), z_dir=(-1, 0, 0))) as fillet2_piece_18b_section:
        with BuildLine():
            CenterArc((FILLET2_R, -FILLET2_R), FILLET2_R, 90, 90)
            Line((0, -FILLET2_R), (0, 0))
            Line((0, 0), (FILLET2_R, 0))
        make_face()
    fillet2_piece_18b = extrude(amount=2.840304801, mode=Mode.PRIVATE)
    fillet2_piece_18b = split(fillet2_piece_18b, bisect_by=Plane(origin=(-1.804401252, 29.282923194, 22.071007558), z_dir=(1, 0, 0)), keep=Keep.TOP, mode=Mode.PRIVATE)
    fillet2_piece_18 = fillet2_piece_18a & fillet2_piece_18b
    add(fillet2_piece_18)
    with BuildSketch(Plane(origin=(-3.644706053, 30.07348378, 21.980449513), x_dir=(0, 0, 1), z_dir=(1, 0, 0))) as fillet2_piece_19a_section:
        with BuildLine():
            CenterArc((FILLET2_R, -FILLET2_R), FILLET2_R, 90, 90)
            Line((0, -FILLET2_R), (0, 0))
            Line((0, 0), (FILLET2_R, 0))
        make_face()
    fillet2_piece_19a = extrude(amount=2.840304801, mode=Mode.PRIVATE)
    fillet2_piece_19a = split(fillet2_piece_19a, bisect_by=Plane(origin=(-1.804401252, 30.164041825, 22.071007558), z_dir=(1, 0, 0)), keep=Keep.TOP, mode=Mode.PRIVATE)
    with BuildSketch(Plane(origin=(-1.804401252, 31.07348378, 21.980449513), x_dir=(0, 0, 1), z_dir=(0, -1, 0))) as fillet2_piece_19b_section:
        with BuildLine():
            CenterArc((FILLET2_R, -FILLET2_R), FILLET2_R, 90, 90)
            Line((0, -FILLET2_R), (0, 0))
            Line((0, 0), (FILLET2_R, 0))
        make_face()
    fillet2_piece_19b = extrude(amount=1.70000254, mode=Mode.PRIVATE)
    fillet2_piece_19b = split(fillet2_piece_19b, bisect_by=Plane(origin=(-1.713843206, 30.07348378, 22.071007558), z_dir=(0, 1, 0)), keep=Keep.TOP, mode=Mode.PRIVATE)
    fillet2_piece_19 = fillet2_piece_19a & fillet2_piece_19b
    add(fillet2_piece_19)


solid = part.part
